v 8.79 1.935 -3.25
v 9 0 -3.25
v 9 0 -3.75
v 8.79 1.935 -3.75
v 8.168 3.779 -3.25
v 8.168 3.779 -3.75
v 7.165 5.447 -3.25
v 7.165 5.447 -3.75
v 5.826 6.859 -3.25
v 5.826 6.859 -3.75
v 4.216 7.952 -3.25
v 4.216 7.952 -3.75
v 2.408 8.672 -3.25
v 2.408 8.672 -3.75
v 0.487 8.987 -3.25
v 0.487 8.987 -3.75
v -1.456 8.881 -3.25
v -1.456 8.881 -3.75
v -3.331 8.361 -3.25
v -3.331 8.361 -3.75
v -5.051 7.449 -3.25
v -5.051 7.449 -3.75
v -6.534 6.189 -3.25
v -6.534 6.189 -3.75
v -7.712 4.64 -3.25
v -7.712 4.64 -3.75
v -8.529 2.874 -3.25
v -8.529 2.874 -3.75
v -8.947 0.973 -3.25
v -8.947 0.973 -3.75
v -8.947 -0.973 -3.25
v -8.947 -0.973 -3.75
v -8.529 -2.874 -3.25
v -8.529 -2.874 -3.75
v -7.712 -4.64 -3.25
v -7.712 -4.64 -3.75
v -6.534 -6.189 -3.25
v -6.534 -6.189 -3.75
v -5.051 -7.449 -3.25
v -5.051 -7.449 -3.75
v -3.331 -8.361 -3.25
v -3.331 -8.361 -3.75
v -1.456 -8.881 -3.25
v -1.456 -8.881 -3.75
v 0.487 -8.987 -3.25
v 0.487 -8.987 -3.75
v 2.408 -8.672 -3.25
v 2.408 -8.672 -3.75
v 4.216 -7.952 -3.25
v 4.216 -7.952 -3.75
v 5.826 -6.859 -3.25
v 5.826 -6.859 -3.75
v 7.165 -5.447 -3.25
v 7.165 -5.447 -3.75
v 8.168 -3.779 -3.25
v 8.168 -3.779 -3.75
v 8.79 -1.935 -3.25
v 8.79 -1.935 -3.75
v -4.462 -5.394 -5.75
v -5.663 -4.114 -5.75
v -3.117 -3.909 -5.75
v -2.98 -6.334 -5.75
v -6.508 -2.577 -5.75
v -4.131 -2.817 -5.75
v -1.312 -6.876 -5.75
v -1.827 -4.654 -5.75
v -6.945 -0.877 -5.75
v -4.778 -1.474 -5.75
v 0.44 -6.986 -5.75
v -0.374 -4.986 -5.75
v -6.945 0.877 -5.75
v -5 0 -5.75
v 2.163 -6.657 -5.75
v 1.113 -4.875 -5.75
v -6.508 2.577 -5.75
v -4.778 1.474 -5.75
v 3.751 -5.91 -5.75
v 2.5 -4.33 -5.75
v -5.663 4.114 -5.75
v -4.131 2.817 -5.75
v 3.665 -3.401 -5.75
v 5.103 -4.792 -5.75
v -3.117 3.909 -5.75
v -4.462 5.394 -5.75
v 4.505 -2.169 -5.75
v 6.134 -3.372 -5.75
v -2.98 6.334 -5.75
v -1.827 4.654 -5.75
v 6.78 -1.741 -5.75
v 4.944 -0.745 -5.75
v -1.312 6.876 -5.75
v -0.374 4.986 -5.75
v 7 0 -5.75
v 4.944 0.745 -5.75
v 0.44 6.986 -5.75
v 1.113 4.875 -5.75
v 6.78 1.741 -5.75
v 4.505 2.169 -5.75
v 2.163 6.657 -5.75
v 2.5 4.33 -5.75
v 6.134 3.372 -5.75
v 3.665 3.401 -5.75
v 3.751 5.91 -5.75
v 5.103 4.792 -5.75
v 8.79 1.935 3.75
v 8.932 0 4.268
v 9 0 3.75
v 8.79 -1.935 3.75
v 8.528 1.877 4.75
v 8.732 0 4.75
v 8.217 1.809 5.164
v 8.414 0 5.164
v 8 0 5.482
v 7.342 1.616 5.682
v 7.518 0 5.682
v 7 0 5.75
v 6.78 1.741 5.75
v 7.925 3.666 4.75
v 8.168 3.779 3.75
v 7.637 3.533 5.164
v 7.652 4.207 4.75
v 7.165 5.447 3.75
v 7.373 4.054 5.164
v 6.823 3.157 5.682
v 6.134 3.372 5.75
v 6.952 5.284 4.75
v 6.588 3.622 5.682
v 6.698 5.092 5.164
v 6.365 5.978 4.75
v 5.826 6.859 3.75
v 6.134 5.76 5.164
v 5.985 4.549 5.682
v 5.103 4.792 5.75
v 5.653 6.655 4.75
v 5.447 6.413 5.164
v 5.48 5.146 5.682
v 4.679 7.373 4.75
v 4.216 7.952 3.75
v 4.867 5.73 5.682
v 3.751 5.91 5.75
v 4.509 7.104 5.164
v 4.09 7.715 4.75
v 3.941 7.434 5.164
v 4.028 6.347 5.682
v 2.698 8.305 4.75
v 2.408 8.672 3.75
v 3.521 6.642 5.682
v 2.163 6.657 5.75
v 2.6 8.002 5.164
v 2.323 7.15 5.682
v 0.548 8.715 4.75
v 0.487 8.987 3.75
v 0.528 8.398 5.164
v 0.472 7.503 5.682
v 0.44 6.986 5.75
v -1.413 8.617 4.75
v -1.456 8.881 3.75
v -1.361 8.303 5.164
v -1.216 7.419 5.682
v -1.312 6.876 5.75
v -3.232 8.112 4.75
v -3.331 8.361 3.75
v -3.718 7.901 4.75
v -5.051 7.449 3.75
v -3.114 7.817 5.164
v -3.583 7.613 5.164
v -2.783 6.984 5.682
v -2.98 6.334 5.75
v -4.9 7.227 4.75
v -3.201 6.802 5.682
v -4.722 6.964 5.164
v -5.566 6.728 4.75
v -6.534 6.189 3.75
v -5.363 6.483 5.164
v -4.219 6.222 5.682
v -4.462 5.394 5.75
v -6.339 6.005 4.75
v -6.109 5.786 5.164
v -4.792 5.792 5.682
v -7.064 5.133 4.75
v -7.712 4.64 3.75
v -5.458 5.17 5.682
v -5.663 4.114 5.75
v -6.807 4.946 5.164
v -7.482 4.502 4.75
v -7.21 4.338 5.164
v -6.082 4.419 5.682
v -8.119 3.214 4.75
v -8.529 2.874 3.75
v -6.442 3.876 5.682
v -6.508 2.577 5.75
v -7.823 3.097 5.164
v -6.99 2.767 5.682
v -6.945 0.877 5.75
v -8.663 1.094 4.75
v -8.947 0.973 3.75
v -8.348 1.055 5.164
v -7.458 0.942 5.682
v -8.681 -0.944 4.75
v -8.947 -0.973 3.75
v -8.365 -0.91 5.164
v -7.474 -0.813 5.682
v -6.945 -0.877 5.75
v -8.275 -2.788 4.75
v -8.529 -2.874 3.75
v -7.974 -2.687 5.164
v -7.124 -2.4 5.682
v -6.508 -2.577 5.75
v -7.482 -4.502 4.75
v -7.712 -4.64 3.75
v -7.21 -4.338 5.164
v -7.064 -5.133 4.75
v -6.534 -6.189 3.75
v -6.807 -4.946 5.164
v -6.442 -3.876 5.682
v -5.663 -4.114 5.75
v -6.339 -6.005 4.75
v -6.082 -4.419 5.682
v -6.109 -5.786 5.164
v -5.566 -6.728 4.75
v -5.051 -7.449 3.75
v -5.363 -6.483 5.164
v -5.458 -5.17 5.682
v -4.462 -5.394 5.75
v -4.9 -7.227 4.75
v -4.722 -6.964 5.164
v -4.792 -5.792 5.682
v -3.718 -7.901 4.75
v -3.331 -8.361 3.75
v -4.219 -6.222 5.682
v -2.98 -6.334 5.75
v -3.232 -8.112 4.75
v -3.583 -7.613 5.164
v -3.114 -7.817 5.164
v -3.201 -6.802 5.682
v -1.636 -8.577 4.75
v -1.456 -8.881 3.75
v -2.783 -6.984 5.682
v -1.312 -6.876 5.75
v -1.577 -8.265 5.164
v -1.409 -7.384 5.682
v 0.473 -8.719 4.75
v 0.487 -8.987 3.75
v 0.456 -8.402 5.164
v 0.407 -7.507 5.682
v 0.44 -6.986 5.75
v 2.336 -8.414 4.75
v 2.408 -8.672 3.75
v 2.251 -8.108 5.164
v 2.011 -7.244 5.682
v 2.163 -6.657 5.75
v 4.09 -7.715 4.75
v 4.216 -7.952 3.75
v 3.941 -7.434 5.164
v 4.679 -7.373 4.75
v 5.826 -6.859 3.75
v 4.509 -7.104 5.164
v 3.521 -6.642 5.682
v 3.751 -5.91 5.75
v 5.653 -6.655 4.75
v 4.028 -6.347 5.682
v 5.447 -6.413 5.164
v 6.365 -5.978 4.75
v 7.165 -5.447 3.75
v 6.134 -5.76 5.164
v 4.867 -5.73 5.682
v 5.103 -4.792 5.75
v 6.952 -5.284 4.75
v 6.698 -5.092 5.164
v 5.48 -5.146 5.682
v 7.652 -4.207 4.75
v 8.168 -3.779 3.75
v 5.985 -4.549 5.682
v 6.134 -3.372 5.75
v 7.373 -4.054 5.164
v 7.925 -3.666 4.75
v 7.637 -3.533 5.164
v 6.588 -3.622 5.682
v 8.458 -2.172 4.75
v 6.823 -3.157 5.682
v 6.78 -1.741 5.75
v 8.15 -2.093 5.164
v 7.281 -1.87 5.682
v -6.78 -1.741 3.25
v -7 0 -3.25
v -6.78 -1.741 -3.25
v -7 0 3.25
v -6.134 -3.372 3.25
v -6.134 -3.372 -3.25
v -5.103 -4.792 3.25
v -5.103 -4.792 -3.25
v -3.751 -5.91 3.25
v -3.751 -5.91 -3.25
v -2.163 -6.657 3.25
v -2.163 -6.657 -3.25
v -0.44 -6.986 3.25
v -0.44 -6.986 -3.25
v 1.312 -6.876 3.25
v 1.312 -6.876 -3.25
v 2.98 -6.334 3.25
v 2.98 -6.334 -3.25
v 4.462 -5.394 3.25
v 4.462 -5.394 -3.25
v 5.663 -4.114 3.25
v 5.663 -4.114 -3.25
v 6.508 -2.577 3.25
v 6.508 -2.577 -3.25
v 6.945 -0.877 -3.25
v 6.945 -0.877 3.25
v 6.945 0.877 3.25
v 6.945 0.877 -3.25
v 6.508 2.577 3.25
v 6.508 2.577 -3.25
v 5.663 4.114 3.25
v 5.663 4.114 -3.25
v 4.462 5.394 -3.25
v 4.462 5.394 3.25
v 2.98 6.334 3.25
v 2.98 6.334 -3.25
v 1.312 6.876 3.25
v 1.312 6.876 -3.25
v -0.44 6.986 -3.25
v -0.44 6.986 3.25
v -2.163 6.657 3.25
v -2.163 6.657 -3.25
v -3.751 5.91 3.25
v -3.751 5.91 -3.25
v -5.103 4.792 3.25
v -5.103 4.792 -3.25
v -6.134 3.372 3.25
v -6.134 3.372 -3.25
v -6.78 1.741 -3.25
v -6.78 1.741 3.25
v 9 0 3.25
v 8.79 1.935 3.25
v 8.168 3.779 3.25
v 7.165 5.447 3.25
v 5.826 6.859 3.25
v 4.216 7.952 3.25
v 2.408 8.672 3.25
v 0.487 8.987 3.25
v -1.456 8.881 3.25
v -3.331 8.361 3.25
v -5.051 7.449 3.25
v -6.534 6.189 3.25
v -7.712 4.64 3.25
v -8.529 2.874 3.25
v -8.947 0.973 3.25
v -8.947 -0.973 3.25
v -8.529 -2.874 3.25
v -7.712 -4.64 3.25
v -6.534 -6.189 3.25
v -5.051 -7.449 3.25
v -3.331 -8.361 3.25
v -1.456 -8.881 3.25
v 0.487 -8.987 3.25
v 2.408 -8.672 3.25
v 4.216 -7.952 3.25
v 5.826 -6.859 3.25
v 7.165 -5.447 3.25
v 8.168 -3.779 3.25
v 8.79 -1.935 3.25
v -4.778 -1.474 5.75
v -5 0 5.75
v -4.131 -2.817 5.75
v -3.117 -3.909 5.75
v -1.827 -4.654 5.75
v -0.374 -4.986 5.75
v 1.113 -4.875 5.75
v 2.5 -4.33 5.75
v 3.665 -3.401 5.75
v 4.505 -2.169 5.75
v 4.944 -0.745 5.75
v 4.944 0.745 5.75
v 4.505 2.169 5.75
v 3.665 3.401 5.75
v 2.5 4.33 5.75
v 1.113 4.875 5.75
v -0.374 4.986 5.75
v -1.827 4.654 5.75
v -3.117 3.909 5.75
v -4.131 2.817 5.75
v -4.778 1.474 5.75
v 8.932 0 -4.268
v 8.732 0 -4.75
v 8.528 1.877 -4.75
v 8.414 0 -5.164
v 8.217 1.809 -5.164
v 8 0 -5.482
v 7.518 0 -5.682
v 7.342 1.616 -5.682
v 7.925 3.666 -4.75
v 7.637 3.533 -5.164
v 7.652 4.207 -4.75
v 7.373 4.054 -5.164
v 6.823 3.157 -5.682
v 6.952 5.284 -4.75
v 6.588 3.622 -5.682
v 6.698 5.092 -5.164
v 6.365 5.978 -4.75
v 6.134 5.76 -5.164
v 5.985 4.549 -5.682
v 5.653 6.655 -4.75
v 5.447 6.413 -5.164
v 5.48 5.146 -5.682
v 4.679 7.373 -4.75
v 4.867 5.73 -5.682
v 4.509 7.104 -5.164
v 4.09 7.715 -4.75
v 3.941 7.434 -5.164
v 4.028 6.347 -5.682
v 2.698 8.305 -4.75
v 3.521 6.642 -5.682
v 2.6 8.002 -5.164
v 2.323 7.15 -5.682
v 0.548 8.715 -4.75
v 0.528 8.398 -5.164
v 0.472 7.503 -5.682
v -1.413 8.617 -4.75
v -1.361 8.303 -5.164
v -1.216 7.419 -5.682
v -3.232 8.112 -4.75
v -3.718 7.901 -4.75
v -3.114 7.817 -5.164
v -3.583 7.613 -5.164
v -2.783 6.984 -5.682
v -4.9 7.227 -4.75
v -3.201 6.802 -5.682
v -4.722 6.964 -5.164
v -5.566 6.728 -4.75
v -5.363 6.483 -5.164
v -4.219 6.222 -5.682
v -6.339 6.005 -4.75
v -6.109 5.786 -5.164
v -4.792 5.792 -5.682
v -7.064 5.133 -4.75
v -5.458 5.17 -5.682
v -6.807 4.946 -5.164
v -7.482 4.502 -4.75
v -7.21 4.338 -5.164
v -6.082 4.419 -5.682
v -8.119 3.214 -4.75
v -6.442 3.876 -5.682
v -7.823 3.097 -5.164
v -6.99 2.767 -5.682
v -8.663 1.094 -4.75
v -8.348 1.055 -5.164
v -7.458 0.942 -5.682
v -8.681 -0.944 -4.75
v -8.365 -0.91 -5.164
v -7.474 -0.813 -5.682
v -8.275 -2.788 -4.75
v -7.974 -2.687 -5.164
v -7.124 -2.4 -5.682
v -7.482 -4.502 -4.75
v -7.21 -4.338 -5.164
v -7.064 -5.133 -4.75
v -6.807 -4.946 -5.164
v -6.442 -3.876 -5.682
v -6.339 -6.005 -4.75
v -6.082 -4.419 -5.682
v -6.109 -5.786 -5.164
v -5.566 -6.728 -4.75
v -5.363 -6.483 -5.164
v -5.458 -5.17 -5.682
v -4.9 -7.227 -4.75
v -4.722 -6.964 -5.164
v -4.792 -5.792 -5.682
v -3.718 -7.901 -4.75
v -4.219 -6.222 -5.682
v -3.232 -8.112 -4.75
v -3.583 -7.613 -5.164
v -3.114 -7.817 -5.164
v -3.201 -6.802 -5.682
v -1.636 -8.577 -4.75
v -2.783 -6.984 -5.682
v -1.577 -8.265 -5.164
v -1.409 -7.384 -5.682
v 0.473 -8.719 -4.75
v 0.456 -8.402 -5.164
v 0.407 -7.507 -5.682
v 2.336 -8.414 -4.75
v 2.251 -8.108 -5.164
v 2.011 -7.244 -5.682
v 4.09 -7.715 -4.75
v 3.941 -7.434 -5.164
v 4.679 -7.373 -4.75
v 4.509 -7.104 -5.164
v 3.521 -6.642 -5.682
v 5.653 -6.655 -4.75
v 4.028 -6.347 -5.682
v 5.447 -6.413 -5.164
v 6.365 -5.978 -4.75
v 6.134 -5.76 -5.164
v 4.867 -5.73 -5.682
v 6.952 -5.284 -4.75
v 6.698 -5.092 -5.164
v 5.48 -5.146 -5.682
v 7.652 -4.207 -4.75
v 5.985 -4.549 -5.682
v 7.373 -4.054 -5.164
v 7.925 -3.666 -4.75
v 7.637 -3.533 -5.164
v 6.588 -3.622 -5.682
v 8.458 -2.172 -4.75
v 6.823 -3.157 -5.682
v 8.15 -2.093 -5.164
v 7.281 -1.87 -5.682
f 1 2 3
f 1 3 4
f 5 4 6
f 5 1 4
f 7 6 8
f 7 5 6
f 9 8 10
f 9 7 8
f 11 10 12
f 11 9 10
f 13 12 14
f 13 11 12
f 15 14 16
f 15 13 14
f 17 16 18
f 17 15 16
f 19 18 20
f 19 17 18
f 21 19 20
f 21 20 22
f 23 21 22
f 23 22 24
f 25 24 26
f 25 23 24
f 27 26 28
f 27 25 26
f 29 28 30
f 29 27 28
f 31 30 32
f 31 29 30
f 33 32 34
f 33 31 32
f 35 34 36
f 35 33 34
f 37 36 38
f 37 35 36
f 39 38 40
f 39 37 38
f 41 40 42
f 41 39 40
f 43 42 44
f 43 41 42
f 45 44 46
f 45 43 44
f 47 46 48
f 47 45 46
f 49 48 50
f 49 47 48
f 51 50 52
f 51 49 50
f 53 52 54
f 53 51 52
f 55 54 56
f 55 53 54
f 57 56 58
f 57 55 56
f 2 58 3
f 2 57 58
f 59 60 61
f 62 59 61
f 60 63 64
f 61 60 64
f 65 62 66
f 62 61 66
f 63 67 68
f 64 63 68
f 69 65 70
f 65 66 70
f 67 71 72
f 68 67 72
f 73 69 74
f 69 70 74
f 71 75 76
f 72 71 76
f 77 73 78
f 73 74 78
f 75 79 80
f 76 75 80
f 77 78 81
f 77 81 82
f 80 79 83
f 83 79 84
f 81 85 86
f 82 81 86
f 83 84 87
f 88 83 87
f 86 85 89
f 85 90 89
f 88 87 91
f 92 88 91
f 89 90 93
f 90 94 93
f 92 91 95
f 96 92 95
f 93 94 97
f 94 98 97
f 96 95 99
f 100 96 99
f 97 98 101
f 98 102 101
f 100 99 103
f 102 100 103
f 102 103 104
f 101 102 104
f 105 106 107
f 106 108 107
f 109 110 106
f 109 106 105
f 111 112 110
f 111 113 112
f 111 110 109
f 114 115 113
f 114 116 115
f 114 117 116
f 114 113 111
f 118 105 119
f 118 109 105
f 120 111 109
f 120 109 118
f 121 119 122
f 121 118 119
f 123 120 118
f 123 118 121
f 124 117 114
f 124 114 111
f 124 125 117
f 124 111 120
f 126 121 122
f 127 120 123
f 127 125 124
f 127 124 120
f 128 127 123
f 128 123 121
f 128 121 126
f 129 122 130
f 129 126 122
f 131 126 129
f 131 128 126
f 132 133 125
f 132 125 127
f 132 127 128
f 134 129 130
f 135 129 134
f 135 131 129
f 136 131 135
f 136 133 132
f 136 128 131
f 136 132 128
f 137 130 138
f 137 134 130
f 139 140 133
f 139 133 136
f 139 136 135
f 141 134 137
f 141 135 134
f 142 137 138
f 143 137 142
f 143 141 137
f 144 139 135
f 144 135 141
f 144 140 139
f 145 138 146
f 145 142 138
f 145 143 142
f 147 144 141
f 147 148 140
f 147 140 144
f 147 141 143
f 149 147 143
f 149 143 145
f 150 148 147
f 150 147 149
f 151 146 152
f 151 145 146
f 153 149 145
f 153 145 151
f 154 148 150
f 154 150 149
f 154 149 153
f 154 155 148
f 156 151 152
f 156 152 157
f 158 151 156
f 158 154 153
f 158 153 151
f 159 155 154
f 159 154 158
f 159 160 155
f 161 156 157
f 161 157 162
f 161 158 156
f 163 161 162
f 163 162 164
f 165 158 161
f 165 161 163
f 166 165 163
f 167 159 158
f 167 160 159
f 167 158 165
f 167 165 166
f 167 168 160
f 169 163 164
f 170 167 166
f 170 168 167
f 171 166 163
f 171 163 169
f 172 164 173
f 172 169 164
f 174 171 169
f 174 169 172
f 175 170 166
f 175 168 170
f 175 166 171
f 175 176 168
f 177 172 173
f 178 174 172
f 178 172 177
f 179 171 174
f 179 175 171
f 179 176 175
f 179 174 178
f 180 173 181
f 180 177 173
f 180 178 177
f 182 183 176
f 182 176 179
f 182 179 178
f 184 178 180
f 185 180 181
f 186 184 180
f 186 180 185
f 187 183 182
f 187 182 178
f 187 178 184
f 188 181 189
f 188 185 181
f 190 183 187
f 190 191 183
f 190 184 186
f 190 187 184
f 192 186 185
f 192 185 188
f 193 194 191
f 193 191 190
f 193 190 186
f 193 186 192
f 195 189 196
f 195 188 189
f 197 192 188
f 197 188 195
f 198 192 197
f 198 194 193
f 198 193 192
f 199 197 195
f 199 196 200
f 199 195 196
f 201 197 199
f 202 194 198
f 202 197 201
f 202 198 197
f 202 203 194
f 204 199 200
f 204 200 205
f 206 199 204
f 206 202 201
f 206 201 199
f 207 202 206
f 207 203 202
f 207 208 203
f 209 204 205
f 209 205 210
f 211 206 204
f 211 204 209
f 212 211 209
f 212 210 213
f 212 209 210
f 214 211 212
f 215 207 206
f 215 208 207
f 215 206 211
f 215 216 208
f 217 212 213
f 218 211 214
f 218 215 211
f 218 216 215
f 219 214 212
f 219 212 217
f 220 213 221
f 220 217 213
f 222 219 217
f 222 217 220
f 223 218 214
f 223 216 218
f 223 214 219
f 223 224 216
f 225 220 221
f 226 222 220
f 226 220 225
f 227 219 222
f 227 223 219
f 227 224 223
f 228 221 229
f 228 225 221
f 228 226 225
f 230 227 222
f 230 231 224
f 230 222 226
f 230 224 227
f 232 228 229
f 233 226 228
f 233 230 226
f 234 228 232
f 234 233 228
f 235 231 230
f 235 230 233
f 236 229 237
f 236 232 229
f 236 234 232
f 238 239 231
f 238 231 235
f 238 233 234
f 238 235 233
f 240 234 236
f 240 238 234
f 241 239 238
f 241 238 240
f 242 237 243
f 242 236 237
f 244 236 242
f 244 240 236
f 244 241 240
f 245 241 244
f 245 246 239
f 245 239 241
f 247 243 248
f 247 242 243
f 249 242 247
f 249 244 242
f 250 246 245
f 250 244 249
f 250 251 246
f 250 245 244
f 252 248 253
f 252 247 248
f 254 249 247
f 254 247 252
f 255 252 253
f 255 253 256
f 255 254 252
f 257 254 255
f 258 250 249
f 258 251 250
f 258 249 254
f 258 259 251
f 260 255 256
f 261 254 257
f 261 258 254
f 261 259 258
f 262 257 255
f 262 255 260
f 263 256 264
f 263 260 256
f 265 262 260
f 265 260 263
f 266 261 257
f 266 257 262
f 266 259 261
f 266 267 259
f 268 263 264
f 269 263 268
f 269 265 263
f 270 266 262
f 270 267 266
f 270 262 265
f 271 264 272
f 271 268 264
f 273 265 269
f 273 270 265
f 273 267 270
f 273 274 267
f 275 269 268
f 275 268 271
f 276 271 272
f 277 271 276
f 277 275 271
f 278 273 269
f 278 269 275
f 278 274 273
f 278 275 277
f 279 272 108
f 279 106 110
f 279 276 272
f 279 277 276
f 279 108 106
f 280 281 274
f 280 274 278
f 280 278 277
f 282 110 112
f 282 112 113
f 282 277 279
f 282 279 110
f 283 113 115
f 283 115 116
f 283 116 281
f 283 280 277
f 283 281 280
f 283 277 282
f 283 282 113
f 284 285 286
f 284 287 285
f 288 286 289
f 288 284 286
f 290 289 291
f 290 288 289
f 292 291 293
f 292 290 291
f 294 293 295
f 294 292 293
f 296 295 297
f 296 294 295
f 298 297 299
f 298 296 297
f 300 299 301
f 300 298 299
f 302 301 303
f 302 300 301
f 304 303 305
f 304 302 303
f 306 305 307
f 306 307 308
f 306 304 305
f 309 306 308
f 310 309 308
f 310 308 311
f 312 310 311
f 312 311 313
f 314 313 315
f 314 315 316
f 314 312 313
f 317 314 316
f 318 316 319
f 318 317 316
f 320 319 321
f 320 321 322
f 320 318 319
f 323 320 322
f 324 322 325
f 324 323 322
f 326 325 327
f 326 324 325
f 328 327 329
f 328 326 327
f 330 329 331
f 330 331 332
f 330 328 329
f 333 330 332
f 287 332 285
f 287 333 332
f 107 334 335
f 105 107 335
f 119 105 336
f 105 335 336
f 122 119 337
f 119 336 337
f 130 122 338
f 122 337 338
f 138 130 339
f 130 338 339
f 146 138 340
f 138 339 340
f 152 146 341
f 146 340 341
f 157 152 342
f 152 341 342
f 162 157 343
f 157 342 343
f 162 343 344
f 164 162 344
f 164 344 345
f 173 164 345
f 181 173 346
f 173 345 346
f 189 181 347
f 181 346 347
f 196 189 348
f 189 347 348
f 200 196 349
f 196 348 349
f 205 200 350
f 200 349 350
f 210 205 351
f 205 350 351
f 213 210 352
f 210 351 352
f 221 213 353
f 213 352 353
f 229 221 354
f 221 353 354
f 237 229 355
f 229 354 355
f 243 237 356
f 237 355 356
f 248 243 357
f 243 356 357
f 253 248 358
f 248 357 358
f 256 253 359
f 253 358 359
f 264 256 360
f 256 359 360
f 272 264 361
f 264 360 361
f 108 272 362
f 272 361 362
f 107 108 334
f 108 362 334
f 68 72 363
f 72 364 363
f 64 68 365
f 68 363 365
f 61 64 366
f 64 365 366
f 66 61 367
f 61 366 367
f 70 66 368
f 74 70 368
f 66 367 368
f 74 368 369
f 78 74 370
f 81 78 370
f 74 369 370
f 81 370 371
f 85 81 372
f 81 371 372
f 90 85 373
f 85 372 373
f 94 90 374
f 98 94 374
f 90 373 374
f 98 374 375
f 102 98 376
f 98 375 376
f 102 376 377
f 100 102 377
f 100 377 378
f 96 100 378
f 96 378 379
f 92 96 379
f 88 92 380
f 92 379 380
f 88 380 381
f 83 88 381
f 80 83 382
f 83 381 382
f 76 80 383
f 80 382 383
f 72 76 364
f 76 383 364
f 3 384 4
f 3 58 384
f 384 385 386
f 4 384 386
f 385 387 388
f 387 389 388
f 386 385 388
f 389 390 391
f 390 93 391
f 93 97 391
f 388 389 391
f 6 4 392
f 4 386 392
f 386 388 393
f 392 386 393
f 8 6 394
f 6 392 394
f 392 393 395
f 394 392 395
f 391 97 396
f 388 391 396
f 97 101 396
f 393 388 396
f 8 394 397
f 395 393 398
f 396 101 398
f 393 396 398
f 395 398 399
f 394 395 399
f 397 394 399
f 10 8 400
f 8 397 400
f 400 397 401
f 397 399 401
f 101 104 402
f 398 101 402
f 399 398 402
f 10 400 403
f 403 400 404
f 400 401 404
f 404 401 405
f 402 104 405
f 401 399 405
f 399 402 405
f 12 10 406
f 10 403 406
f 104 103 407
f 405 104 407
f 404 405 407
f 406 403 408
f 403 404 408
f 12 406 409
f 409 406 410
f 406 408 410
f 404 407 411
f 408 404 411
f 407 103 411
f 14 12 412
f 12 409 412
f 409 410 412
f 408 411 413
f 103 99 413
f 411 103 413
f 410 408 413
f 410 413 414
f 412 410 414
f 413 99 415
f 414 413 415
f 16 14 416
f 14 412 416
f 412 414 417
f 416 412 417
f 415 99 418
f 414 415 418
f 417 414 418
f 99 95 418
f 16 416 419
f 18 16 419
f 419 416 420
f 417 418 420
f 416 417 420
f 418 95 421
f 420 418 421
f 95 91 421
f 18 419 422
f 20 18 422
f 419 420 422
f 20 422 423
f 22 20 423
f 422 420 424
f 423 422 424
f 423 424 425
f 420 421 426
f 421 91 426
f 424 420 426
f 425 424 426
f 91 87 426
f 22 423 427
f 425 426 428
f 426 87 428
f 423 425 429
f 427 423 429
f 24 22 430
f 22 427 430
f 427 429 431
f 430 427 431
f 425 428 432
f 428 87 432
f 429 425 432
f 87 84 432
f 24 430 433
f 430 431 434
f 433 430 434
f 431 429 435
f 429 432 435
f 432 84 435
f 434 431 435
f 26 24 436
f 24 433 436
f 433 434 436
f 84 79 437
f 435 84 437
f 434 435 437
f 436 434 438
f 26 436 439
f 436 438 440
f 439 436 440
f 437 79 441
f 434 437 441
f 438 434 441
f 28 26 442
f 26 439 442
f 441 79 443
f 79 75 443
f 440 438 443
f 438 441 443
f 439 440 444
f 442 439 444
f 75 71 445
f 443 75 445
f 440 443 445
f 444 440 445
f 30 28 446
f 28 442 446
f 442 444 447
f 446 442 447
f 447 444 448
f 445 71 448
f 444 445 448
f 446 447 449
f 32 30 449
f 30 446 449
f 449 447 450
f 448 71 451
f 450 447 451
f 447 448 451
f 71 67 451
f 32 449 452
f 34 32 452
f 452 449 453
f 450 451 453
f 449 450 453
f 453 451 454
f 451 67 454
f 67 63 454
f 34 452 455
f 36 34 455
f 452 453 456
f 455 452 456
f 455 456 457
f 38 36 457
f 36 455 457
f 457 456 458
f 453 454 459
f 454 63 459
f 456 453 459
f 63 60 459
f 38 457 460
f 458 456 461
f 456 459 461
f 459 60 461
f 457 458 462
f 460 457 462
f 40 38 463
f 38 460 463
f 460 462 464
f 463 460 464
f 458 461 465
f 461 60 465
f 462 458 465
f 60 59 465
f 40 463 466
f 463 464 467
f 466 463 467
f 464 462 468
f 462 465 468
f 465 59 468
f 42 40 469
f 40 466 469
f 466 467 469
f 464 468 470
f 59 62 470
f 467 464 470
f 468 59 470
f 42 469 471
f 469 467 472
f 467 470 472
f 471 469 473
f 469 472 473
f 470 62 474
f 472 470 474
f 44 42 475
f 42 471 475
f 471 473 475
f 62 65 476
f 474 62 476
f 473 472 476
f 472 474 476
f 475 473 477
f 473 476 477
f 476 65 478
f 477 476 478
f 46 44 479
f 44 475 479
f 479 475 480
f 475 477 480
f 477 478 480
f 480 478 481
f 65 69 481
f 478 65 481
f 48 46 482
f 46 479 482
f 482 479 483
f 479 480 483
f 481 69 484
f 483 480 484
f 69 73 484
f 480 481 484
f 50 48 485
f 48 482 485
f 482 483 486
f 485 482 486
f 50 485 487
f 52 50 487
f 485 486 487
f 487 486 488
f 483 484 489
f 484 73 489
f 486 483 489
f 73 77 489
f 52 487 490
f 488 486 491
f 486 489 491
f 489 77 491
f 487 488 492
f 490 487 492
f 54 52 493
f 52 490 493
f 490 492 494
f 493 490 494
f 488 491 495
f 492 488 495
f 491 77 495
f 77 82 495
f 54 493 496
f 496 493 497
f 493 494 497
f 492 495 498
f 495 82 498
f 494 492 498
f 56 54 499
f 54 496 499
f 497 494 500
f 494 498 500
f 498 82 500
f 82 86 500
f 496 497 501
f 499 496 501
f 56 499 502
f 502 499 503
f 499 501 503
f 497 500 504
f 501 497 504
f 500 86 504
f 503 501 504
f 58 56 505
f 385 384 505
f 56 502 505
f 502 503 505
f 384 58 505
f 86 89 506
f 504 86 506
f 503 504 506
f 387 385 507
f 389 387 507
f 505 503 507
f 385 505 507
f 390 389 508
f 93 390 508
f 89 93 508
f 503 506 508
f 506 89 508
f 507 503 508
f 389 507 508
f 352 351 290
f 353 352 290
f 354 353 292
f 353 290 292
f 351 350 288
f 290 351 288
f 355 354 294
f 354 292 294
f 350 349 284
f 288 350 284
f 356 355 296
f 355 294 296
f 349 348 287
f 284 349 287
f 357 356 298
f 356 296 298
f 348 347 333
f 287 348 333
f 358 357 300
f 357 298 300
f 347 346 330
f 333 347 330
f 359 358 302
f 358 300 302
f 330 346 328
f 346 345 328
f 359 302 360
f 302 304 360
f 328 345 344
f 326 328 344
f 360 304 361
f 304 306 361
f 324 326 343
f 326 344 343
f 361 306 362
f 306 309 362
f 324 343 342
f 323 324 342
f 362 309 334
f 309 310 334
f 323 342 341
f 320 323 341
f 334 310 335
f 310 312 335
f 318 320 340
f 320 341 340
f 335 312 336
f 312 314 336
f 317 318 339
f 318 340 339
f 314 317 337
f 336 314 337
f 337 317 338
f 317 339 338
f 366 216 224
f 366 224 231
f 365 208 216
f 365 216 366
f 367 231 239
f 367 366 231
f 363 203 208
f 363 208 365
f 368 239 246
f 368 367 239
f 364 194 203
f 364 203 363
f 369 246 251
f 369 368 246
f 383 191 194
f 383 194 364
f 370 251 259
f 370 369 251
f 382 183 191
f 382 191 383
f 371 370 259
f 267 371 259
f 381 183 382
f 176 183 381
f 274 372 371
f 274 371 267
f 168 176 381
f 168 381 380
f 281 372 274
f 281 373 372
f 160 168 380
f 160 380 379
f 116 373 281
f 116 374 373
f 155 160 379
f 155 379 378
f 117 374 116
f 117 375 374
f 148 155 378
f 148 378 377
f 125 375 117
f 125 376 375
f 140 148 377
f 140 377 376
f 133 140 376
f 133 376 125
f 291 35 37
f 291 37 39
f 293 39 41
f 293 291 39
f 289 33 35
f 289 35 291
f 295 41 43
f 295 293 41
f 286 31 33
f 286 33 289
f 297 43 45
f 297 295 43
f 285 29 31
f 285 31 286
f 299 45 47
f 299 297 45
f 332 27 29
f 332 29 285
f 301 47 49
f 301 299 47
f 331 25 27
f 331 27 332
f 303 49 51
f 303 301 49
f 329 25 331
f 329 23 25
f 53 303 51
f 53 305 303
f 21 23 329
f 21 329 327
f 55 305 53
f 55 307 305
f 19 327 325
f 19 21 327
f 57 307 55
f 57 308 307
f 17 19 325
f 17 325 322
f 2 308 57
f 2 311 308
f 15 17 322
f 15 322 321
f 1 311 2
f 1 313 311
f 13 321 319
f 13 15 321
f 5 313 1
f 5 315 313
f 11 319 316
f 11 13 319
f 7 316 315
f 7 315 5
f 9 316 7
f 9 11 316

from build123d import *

# Parameters (mm, degrees)
SKETCH1_R            = 7
SKETCH1_R_2          = 5
BOSS_EXTRUDE1_DEPTH  = 3.25
SKETCH2_R            = 9
SKETCH2_R_2          = 5
BOSS_EXTRUDE2_DEPTH  = 2.5
FILLET1_R            = 2
FILLET1_OF_MIRROR1_R = 2


with BuildPart() as part:
    # Sketch1 → Boss-Extrude1 (new, symmetric)
    with BuildSketch(Plane.XY):
        with Locations(Location((0, 0, 0), (0, 0, 180))):
            Circle(SKETCH1_R)
        with Locations(Location((0, 0, 0), (0, 0, 180))):
            Circle(SKETCH1_R_2, mode=Mode.SUBTRACT)
    extrude(amount=BOSS_EXTRUDE1_DEPTH, both=True)

    # Sketch2 → Boss-Extrude2 (add)
    with BuildSketch(Plane.XY.offset(3.25)):
        Circle(SKETCH2_R)
        with Locations(Location((0, 0, 0), (0, 0, 180))):
            Circle(SKETCH2_R_2, mode=Mode.SUBTRACT)
    boss_extrude2 = extrude(amount=BOSS_EXTRUDE2_DEPTH)

    # Fillet1
    fillet1_edges = [part.edges().sort_by_distance(p)[0] for p in [
        (-9, 0, 5.75),
    ]]
    fillet(fillet1_edges, radius=FILLET1_R)

    # Mirror1: Boss-Extrude2 across plane
    add(boss_extrude2.mirror(Plane.XY))

    # Fillet1 of Mirror1
    fillet1_of_mirror1_edges = [part.edges().sort_by_distance(p)[0] for p in [
        (-9, 0, -5.75),
    ]]
    fillet(fillet1_of_mirror1_edges, radius=FILLET1_OF_MIRROR1_R)


solid = part.part
